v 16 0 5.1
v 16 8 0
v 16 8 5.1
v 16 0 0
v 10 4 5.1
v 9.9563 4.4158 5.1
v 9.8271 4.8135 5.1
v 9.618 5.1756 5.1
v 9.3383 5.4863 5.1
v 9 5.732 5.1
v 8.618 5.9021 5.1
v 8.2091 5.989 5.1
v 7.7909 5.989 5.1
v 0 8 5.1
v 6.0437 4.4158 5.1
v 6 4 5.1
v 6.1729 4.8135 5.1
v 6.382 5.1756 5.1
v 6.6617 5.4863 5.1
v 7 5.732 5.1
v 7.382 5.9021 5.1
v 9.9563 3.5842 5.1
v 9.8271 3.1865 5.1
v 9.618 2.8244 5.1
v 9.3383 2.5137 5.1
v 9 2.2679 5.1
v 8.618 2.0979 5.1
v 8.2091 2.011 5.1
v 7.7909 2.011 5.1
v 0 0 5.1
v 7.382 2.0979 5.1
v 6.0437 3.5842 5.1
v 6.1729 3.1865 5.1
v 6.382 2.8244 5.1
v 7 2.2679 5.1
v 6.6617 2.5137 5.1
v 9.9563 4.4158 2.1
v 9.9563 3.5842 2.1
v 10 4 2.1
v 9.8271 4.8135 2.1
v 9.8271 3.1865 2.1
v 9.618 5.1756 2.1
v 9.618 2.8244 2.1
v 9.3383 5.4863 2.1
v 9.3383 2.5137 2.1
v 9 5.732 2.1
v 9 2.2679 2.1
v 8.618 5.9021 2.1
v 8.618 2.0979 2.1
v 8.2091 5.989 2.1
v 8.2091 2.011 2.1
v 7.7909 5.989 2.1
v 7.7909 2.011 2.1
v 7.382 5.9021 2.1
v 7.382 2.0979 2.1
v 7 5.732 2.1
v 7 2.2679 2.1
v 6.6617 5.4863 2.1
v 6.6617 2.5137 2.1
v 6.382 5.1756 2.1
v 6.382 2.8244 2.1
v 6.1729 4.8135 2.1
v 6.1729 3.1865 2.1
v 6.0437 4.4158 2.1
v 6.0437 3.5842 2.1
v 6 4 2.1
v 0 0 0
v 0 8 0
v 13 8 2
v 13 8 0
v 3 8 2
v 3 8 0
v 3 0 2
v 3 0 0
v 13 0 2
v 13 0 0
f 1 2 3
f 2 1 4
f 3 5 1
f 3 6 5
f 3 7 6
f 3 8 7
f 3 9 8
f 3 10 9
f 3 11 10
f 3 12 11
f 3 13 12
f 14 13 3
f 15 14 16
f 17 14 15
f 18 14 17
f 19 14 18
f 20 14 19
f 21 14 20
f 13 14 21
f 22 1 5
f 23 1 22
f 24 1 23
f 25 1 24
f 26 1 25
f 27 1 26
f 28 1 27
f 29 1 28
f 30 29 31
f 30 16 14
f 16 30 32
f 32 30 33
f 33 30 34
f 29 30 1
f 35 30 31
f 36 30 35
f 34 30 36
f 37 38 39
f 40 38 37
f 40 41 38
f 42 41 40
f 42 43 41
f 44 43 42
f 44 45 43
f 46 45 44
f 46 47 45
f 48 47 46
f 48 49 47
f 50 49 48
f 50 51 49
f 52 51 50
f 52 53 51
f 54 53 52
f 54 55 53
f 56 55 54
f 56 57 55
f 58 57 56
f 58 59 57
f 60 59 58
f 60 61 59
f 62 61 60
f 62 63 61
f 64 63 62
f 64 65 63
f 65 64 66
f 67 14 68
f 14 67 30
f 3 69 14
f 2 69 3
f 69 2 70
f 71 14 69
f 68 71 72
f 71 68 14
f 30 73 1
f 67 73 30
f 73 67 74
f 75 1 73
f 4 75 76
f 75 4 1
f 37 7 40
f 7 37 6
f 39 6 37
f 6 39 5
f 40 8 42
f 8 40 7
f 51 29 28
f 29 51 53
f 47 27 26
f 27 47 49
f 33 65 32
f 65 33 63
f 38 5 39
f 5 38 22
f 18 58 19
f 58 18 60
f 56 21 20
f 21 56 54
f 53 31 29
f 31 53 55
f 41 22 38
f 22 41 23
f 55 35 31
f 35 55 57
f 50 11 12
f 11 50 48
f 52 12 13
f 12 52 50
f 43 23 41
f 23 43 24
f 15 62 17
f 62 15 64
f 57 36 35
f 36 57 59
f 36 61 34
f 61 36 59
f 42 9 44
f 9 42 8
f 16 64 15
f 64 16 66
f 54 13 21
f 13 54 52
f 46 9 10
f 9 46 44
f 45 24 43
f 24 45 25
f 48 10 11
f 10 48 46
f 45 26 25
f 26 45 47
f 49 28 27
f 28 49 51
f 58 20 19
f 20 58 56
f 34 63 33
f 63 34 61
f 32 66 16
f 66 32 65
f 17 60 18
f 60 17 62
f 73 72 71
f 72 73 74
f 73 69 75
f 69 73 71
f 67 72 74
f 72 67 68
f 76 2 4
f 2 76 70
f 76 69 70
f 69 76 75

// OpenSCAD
layer_height = 0.1;

cube([3, 8, 2]);
translate([13, 0, 0]) {
	cube([3, 8, 2]);
}
translate([0, 0, 2]) {
	cube([16, 8, layer_height]);
}
difference() {
	translate([0, 0, 2 + layer_height]) {
		cube([16, 8, 3]);
	}
	translate([8, 4, 2 + layer_height]) {
		cylinder(r=2, h=3, $fn=30);
	}
}
